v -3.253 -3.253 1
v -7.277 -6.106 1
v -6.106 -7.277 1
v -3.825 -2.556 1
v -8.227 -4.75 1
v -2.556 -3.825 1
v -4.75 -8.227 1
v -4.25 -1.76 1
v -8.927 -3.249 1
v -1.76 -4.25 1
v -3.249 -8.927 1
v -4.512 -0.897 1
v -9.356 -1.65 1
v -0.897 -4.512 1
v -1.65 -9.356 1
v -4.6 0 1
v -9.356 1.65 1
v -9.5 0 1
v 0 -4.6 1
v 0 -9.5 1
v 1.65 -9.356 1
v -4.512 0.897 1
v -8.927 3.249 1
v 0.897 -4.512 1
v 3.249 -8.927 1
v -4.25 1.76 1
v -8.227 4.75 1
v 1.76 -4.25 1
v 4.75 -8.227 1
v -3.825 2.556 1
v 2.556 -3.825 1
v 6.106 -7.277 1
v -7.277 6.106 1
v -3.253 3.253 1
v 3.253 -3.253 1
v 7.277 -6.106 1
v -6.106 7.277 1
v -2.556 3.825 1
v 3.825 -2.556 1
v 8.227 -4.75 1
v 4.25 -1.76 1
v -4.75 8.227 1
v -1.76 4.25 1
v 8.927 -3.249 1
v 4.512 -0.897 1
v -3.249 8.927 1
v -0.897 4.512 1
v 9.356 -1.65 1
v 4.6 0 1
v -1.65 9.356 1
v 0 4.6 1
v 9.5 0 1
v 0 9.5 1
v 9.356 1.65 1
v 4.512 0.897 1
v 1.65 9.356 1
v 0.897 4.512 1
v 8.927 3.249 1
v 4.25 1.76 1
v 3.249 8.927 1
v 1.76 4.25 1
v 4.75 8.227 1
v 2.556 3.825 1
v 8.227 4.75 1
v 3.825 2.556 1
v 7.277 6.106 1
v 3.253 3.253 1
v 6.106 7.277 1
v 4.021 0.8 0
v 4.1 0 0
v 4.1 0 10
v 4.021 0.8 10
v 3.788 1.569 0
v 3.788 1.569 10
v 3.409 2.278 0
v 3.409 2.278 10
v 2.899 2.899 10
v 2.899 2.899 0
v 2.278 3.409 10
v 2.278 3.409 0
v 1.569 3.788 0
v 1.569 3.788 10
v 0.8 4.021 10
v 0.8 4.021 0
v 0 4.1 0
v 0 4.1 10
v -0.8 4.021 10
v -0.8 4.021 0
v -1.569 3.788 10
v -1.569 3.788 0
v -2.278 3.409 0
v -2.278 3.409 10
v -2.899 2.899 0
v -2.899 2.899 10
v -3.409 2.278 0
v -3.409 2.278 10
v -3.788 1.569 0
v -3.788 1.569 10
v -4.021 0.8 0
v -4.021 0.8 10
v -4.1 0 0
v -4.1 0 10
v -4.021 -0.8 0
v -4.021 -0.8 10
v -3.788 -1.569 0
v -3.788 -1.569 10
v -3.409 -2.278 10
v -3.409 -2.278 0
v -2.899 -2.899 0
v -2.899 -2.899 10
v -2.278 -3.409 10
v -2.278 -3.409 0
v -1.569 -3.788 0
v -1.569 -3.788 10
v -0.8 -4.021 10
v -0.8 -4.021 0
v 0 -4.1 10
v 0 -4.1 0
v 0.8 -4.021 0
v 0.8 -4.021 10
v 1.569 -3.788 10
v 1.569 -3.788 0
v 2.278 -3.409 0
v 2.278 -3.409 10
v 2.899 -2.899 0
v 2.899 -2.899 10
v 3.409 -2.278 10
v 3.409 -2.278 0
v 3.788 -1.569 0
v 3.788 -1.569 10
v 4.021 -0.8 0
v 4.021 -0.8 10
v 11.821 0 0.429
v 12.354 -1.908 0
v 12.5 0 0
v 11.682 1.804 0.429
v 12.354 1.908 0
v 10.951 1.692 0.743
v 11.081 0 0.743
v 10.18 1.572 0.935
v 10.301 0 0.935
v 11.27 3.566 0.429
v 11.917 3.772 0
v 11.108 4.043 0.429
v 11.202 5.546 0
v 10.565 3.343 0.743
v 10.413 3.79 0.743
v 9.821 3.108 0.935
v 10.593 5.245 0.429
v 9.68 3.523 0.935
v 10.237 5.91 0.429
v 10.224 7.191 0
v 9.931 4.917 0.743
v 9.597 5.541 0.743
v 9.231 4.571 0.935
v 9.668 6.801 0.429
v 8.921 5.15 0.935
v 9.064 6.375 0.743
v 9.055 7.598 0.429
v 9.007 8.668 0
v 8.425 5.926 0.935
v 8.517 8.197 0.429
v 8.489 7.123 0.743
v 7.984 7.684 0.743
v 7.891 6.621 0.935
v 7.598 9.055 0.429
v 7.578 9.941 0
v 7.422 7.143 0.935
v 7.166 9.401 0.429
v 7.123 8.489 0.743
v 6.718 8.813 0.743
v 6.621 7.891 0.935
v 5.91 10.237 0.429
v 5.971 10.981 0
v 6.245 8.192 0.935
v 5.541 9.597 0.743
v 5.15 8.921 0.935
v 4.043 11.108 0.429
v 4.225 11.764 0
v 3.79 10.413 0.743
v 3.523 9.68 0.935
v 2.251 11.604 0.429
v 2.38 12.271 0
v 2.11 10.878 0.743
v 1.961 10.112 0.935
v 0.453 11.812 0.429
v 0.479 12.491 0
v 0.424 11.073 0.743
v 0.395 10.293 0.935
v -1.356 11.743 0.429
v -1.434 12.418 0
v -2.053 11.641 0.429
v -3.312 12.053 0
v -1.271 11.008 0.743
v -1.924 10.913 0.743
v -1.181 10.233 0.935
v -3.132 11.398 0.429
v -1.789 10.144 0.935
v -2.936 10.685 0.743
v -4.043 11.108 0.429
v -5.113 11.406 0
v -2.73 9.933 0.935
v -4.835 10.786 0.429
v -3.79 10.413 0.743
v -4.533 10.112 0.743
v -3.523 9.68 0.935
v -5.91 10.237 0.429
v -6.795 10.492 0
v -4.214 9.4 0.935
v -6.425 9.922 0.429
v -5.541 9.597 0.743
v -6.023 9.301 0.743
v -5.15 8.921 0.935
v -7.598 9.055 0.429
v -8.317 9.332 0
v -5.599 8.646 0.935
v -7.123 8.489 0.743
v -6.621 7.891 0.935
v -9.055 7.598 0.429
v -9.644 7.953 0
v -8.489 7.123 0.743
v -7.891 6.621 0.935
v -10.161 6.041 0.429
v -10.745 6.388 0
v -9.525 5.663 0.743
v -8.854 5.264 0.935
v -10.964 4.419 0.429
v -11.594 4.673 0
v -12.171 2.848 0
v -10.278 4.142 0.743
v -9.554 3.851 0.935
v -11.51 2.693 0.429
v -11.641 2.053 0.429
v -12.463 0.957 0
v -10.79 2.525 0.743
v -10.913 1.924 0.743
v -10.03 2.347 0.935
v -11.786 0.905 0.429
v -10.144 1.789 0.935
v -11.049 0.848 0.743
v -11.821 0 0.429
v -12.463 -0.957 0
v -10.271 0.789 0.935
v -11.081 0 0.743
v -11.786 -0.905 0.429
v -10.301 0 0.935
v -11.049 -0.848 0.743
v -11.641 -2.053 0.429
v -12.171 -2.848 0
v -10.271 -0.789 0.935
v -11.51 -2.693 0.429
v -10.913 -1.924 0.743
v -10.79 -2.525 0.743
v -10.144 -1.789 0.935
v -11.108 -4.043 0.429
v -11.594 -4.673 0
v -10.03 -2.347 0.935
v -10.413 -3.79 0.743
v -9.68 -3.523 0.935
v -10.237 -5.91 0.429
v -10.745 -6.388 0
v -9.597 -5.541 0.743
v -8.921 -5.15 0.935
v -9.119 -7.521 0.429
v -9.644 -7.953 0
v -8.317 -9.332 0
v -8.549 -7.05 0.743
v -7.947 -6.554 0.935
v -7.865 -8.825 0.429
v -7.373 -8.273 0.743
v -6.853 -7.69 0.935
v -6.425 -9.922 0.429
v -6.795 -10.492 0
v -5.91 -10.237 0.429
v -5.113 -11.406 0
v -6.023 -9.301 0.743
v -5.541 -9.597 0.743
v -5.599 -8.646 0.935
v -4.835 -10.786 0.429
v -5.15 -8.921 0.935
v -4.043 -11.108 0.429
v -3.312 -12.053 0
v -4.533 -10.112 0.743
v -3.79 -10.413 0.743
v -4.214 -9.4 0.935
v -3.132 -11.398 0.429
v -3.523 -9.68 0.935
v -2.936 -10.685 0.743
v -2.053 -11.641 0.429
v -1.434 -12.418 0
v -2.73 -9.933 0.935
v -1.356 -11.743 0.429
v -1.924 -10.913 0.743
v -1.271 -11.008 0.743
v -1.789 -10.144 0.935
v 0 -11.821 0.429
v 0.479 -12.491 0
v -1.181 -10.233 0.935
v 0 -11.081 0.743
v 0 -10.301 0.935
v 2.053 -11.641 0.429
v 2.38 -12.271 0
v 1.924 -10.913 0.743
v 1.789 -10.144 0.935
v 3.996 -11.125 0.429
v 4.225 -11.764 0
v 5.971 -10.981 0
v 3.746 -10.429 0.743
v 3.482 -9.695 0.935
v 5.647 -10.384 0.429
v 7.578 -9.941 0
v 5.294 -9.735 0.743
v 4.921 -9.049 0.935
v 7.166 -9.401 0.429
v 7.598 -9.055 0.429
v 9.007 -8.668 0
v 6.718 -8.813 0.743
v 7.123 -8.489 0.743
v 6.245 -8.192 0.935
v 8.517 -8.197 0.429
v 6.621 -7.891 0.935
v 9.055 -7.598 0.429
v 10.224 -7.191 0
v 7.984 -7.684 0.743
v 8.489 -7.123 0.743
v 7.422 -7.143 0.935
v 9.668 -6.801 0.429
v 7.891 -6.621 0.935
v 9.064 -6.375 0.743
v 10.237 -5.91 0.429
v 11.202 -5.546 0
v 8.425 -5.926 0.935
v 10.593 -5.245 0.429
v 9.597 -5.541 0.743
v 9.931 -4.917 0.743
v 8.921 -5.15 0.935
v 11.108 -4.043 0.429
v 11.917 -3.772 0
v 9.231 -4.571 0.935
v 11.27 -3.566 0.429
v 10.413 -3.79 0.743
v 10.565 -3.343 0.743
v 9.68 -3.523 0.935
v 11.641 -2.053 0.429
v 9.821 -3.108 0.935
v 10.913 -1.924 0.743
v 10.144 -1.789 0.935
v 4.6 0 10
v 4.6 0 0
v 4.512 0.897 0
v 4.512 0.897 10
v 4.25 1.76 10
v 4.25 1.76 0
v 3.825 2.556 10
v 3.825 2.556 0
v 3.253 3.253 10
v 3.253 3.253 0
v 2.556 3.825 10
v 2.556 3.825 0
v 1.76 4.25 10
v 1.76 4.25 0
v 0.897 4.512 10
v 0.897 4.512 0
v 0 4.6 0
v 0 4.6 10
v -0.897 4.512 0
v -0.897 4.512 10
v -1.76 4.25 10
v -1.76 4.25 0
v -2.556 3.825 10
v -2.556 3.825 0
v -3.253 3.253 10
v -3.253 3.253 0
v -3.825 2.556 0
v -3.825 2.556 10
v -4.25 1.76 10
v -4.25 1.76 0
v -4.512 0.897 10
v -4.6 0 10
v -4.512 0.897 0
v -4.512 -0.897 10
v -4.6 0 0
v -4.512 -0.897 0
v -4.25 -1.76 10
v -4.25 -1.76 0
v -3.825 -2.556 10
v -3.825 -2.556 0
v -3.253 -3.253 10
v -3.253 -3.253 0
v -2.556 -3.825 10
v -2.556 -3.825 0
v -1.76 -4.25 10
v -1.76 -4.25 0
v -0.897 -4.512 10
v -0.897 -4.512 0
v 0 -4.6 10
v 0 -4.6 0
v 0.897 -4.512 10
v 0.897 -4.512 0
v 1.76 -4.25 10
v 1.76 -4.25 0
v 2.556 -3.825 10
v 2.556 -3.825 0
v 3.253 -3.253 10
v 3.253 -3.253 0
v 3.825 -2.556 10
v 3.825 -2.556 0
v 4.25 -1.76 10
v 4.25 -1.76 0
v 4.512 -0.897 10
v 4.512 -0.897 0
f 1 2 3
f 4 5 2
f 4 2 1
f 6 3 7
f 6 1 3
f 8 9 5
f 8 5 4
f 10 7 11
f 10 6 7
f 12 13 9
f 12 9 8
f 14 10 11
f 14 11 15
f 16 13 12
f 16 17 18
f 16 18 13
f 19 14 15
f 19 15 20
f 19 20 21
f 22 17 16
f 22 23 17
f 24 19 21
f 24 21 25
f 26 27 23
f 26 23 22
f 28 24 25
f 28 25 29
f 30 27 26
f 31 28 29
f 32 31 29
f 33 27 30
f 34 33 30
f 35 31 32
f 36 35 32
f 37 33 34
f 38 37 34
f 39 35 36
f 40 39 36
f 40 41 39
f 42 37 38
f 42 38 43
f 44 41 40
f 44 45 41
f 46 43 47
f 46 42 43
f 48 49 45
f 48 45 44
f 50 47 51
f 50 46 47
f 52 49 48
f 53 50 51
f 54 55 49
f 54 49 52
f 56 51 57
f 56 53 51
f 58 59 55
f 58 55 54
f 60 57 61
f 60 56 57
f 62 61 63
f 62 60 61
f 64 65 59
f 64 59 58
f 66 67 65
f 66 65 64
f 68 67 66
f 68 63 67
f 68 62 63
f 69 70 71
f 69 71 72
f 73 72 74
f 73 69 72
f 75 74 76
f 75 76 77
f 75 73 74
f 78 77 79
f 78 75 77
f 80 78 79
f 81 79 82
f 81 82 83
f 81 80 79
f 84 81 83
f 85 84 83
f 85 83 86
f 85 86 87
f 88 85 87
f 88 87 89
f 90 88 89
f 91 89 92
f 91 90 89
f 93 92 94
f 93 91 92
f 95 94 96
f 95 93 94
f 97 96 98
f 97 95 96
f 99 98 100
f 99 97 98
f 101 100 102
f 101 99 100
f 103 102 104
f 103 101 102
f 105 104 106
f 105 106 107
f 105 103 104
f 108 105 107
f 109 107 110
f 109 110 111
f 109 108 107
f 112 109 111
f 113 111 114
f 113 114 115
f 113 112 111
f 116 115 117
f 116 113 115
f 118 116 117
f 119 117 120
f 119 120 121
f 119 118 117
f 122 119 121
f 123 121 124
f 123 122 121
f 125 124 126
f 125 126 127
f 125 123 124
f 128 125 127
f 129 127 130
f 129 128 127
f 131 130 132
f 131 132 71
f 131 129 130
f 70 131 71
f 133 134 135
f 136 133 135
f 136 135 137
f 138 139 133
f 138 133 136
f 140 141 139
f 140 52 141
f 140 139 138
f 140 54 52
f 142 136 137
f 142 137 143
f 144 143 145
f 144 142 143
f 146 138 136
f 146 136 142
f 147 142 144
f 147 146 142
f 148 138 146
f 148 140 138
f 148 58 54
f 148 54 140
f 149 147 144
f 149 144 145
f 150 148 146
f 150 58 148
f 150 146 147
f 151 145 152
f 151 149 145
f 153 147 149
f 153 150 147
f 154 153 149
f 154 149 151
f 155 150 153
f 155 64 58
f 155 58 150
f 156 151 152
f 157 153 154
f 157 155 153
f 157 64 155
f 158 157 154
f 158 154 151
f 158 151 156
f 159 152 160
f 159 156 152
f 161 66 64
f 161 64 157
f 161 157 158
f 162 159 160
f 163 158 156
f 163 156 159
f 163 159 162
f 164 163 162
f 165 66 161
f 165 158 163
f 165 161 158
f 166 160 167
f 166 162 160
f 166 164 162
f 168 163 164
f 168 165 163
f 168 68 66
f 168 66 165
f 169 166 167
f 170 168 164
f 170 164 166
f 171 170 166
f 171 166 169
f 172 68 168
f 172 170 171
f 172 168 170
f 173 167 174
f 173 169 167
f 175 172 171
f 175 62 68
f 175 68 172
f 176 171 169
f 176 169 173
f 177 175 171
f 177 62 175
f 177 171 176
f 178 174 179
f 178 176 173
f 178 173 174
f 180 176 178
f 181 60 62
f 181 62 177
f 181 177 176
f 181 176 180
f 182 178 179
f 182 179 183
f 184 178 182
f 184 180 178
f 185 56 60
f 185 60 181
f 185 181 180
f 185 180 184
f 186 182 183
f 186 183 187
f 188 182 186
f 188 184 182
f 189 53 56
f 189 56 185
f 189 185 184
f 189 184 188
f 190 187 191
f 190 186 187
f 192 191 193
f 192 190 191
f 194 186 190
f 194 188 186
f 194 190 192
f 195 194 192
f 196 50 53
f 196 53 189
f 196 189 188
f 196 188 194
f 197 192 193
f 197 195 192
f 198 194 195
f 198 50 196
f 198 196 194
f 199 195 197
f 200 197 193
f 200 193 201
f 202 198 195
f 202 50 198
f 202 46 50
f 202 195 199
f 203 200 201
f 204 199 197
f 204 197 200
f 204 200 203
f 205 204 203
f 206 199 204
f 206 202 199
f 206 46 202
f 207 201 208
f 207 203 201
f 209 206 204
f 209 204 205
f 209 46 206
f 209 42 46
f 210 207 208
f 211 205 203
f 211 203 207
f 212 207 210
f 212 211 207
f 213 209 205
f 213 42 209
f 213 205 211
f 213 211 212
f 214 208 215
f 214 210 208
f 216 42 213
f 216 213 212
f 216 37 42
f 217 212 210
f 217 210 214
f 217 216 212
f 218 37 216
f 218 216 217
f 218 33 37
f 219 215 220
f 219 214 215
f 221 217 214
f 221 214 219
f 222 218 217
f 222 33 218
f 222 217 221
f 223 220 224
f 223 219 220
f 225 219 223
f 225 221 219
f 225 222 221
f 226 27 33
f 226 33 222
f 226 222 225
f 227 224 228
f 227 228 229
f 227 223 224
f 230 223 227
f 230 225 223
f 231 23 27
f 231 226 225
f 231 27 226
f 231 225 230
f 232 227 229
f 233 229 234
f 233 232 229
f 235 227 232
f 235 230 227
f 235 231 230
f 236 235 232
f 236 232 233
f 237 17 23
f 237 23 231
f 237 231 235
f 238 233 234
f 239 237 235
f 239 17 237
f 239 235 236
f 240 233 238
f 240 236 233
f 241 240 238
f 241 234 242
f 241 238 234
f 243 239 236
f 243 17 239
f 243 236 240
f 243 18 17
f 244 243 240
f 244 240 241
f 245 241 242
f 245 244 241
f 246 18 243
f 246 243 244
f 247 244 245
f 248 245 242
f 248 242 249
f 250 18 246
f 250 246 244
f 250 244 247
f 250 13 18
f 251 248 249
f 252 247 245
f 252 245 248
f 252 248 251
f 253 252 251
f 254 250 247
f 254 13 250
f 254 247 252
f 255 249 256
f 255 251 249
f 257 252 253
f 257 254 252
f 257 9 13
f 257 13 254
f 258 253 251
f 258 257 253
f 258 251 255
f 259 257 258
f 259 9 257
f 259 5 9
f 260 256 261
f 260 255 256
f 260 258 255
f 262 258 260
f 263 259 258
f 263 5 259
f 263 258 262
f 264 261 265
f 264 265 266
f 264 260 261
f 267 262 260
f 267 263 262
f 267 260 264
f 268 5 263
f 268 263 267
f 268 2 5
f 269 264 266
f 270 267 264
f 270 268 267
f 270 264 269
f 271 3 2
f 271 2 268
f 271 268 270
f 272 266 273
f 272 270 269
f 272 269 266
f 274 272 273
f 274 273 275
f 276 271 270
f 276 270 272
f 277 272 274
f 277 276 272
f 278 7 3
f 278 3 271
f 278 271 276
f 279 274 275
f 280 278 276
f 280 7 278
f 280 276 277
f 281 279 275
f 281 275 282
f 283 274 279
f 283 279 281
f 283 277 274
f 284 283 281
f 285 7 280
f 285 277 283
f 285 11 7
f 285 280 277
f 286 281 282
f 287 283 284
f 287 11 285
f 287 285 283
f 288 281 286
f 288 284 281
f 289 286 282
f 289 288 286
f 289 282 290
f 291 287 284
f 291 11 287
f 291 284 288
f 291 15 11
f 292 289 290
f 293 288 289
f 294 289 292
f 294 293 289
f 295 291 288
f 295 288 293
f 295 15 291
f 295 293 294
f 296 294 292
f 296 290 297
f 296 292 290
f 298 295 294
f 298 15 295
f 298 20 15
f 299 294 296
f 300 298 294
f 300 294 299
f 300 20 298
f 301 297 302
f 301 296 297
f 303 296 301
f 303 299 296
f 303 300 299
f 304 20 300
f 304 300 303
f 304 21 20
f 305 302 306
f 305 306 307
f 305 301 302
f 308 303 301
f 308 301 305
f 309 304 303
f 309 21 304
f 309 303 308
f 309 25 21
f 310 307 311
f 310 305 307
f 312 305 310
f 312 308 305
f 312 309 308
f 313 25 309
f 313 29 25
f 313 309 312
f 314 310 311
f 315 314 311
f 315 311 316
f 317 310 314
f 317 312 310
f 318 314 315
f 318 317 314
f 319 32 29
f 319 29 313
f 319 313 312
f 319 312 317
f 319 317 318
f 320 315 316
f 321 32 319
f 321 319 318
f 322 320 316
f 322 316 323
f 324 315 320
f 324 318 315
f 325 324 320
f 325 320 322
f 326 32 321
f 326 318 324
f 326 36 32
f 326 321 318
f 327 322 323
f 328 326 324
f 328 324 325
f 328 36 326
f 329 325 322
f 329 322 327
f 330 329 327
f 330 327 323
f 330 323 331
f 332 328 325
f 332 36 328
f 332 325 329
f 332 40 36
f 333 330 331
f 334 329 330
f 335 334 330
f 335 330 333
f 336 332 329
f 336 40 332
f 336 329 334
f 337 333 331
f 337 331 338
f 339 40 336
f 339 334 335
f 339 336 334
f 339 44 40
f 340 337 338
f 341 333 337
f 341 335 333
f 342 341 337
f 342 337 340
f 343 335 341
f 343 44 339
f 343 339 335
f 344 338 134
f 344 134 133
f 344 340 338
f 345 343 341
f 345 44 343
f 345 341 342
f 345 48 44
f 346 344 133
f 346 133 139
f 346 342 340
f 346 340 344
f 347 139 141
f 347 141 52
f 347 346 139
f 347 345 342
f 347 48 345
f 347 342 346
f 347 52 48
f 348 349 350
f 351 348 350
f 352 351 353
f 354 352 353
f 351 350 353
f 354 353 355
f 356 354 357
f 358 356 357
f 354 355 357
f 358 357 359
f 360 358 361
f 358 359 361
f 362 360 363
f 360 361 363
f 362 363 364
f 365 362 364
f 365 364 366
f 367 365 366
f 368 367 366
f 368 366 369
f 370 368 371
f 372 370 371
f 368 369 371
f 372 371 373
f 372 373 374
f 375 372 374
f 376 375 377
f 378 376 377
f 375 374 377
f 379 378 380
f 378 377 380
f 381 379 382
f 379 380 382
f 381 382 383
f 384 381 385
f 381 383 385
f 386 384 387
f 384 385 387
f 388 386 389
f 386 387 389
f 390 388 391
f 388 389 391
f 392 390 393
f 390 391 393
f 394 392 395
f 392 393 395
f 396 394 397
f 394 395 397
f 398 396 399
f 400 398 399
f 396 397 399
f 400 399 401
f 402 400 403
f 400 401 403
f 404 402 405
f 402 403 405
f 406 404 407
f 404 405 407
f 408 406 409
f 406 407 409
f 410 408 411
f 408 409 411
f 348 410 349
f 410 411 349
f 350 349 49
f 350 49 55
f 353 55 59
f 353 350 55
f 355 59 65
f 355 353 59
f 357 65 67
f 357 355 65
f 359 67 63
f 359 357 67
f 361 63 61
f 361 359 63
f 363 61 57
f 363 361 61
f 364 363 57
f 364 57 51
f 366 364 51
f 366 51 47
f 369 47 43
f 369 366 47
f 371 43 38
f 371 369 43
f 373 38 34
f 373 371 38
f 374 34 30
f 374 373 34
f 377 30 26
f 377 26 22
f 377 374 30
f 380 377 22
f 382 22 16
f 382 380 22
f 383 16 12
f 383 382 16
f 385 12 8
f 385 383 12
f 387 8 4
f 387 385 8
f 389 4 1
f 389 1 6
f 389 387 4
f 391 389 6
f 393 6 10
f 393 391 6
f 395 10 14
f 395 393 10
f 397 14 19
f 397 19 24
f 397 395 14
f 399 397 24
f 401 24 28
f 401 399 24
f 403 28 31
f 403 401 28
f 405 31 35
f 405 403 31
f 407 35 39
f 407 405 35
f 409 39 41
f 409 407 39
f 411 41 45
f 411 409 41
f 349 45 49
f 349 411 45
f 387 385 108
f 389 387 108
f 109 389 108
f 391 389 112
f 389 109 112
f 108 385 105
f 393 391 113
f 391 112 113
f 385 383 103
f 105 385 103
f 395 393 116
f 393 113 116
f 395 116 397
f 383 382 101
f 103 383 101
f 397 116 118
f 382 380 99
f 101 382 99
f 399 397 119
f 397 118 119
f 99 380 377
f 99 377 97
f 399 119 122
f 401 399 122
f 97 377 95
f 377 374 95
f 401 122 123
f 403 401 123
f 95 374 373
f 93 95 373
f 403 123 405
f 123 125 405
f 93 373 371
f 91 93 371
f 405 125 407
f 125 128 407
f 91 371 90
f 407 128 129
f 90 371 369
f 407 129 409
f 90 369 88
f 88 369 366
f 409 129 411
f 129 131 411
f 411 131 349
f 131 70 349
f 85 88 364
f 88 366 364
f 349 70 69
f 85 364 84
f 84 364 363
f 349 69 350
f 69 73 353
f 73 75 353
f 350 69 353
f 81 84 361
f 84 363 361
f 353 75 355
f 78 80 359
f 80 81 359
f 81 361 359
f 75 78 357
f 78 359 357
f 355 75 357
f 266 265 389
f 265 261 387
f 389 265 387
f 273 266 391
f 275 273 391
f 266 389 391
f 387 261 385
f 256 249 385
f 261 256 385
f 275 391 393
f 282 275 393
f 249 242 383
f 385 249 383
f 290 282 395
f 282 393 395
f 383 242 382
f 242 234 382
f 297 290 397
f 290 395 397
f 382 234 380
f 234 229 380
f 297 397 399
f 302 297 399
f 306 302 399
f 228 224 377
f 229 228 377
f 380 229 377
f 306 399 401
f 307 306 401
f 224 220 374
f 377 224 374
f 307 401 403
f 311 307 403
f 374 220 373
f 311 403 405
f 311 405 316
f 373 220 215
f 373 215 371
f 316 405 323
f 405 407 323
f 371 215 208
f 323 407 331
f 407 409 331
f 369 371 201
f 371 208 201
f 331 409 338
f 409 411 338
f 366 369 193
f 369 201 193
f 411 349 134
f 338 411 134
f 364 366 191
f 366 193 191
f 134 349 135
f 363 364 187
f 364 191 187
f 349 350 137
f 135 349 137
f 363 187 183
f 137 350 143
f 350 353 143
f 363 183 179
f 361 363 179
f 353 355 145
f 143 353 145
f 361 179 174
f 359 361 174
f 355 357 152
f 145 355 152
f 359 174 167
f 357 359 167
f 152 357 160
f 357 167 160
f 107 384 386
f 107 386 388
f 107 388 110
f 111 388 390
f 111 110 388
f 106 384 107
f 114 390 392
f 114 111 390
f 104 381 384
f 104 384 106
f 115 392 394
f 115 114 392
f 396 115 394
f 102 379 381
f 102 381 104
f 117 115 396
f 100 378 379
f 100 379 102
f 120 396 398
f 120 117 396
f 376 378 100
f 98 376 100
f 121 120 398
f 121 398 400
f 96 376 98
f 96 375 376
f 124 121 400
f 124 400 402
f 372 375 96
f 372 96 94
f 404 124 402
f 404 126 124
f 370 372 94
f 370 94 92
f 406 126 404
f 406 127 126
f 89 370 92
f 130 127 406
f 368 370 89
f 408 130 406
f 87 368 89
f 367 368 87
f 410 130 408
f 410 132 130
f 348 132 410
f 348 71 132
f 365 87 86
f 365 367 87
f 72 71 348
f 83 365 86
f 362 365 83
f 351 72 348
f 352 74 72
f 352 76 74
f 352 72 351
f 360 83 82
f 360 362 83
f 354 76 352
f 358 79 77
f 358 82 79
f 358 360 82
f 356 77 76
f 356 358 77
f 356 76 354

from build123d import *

# Parameters (mm, degrees)
F0_R     = 4.6
F0_R_2   = 4.1
F1_DEPTH = 10
F0_R_3   = 12.5
F2_DEPTH = 1


# Not quite as in the source:
# - a fillet or chamfer that OpenCascade refuses, or shapes differently, is made with other operations: its cross-section is extruded or revolved along the edge and cut away or added


with BuildPart() as f1:
    # F0 (on Top) → F1 (new body)
    with BuildSketch(Plane.XY):
        Circle(F0_R)
        Circle(F0_R_2, mode=Mode.SUBTRACT)
    extrude(amount=F1_DEPTH)


with BuildPart() as f2:
    # F0 (on Top) → F2 (new body)
    with BuildSketch(Plane.XY):
        Circle(F0_R_3)
        Circle(F0_R, mode=Mode.SUBTRACT)
    extrude(amount=F2_DEPTH)

    # F3: fillet of radius 5 on 1 edges, made by hand

    # F3_s1 → F3_t2 (revolve, cut)
    with BuildSketch(Plane.XZ):
        with BuildLine():
            ThreePointArc((12.5, 0), (11.0811388301, 0.7434164903), (9.5, 1))
            Line((9.5, 1), (12.5, 1))
            Line((12.5, 1), (12.5, 0))
        make_face()
    revolve(axis=Axis((0, 0, 1), (0, 0, 1)), mode=Mode.SUBTRACT)


solid = Compound([f1.part, f2.part])
